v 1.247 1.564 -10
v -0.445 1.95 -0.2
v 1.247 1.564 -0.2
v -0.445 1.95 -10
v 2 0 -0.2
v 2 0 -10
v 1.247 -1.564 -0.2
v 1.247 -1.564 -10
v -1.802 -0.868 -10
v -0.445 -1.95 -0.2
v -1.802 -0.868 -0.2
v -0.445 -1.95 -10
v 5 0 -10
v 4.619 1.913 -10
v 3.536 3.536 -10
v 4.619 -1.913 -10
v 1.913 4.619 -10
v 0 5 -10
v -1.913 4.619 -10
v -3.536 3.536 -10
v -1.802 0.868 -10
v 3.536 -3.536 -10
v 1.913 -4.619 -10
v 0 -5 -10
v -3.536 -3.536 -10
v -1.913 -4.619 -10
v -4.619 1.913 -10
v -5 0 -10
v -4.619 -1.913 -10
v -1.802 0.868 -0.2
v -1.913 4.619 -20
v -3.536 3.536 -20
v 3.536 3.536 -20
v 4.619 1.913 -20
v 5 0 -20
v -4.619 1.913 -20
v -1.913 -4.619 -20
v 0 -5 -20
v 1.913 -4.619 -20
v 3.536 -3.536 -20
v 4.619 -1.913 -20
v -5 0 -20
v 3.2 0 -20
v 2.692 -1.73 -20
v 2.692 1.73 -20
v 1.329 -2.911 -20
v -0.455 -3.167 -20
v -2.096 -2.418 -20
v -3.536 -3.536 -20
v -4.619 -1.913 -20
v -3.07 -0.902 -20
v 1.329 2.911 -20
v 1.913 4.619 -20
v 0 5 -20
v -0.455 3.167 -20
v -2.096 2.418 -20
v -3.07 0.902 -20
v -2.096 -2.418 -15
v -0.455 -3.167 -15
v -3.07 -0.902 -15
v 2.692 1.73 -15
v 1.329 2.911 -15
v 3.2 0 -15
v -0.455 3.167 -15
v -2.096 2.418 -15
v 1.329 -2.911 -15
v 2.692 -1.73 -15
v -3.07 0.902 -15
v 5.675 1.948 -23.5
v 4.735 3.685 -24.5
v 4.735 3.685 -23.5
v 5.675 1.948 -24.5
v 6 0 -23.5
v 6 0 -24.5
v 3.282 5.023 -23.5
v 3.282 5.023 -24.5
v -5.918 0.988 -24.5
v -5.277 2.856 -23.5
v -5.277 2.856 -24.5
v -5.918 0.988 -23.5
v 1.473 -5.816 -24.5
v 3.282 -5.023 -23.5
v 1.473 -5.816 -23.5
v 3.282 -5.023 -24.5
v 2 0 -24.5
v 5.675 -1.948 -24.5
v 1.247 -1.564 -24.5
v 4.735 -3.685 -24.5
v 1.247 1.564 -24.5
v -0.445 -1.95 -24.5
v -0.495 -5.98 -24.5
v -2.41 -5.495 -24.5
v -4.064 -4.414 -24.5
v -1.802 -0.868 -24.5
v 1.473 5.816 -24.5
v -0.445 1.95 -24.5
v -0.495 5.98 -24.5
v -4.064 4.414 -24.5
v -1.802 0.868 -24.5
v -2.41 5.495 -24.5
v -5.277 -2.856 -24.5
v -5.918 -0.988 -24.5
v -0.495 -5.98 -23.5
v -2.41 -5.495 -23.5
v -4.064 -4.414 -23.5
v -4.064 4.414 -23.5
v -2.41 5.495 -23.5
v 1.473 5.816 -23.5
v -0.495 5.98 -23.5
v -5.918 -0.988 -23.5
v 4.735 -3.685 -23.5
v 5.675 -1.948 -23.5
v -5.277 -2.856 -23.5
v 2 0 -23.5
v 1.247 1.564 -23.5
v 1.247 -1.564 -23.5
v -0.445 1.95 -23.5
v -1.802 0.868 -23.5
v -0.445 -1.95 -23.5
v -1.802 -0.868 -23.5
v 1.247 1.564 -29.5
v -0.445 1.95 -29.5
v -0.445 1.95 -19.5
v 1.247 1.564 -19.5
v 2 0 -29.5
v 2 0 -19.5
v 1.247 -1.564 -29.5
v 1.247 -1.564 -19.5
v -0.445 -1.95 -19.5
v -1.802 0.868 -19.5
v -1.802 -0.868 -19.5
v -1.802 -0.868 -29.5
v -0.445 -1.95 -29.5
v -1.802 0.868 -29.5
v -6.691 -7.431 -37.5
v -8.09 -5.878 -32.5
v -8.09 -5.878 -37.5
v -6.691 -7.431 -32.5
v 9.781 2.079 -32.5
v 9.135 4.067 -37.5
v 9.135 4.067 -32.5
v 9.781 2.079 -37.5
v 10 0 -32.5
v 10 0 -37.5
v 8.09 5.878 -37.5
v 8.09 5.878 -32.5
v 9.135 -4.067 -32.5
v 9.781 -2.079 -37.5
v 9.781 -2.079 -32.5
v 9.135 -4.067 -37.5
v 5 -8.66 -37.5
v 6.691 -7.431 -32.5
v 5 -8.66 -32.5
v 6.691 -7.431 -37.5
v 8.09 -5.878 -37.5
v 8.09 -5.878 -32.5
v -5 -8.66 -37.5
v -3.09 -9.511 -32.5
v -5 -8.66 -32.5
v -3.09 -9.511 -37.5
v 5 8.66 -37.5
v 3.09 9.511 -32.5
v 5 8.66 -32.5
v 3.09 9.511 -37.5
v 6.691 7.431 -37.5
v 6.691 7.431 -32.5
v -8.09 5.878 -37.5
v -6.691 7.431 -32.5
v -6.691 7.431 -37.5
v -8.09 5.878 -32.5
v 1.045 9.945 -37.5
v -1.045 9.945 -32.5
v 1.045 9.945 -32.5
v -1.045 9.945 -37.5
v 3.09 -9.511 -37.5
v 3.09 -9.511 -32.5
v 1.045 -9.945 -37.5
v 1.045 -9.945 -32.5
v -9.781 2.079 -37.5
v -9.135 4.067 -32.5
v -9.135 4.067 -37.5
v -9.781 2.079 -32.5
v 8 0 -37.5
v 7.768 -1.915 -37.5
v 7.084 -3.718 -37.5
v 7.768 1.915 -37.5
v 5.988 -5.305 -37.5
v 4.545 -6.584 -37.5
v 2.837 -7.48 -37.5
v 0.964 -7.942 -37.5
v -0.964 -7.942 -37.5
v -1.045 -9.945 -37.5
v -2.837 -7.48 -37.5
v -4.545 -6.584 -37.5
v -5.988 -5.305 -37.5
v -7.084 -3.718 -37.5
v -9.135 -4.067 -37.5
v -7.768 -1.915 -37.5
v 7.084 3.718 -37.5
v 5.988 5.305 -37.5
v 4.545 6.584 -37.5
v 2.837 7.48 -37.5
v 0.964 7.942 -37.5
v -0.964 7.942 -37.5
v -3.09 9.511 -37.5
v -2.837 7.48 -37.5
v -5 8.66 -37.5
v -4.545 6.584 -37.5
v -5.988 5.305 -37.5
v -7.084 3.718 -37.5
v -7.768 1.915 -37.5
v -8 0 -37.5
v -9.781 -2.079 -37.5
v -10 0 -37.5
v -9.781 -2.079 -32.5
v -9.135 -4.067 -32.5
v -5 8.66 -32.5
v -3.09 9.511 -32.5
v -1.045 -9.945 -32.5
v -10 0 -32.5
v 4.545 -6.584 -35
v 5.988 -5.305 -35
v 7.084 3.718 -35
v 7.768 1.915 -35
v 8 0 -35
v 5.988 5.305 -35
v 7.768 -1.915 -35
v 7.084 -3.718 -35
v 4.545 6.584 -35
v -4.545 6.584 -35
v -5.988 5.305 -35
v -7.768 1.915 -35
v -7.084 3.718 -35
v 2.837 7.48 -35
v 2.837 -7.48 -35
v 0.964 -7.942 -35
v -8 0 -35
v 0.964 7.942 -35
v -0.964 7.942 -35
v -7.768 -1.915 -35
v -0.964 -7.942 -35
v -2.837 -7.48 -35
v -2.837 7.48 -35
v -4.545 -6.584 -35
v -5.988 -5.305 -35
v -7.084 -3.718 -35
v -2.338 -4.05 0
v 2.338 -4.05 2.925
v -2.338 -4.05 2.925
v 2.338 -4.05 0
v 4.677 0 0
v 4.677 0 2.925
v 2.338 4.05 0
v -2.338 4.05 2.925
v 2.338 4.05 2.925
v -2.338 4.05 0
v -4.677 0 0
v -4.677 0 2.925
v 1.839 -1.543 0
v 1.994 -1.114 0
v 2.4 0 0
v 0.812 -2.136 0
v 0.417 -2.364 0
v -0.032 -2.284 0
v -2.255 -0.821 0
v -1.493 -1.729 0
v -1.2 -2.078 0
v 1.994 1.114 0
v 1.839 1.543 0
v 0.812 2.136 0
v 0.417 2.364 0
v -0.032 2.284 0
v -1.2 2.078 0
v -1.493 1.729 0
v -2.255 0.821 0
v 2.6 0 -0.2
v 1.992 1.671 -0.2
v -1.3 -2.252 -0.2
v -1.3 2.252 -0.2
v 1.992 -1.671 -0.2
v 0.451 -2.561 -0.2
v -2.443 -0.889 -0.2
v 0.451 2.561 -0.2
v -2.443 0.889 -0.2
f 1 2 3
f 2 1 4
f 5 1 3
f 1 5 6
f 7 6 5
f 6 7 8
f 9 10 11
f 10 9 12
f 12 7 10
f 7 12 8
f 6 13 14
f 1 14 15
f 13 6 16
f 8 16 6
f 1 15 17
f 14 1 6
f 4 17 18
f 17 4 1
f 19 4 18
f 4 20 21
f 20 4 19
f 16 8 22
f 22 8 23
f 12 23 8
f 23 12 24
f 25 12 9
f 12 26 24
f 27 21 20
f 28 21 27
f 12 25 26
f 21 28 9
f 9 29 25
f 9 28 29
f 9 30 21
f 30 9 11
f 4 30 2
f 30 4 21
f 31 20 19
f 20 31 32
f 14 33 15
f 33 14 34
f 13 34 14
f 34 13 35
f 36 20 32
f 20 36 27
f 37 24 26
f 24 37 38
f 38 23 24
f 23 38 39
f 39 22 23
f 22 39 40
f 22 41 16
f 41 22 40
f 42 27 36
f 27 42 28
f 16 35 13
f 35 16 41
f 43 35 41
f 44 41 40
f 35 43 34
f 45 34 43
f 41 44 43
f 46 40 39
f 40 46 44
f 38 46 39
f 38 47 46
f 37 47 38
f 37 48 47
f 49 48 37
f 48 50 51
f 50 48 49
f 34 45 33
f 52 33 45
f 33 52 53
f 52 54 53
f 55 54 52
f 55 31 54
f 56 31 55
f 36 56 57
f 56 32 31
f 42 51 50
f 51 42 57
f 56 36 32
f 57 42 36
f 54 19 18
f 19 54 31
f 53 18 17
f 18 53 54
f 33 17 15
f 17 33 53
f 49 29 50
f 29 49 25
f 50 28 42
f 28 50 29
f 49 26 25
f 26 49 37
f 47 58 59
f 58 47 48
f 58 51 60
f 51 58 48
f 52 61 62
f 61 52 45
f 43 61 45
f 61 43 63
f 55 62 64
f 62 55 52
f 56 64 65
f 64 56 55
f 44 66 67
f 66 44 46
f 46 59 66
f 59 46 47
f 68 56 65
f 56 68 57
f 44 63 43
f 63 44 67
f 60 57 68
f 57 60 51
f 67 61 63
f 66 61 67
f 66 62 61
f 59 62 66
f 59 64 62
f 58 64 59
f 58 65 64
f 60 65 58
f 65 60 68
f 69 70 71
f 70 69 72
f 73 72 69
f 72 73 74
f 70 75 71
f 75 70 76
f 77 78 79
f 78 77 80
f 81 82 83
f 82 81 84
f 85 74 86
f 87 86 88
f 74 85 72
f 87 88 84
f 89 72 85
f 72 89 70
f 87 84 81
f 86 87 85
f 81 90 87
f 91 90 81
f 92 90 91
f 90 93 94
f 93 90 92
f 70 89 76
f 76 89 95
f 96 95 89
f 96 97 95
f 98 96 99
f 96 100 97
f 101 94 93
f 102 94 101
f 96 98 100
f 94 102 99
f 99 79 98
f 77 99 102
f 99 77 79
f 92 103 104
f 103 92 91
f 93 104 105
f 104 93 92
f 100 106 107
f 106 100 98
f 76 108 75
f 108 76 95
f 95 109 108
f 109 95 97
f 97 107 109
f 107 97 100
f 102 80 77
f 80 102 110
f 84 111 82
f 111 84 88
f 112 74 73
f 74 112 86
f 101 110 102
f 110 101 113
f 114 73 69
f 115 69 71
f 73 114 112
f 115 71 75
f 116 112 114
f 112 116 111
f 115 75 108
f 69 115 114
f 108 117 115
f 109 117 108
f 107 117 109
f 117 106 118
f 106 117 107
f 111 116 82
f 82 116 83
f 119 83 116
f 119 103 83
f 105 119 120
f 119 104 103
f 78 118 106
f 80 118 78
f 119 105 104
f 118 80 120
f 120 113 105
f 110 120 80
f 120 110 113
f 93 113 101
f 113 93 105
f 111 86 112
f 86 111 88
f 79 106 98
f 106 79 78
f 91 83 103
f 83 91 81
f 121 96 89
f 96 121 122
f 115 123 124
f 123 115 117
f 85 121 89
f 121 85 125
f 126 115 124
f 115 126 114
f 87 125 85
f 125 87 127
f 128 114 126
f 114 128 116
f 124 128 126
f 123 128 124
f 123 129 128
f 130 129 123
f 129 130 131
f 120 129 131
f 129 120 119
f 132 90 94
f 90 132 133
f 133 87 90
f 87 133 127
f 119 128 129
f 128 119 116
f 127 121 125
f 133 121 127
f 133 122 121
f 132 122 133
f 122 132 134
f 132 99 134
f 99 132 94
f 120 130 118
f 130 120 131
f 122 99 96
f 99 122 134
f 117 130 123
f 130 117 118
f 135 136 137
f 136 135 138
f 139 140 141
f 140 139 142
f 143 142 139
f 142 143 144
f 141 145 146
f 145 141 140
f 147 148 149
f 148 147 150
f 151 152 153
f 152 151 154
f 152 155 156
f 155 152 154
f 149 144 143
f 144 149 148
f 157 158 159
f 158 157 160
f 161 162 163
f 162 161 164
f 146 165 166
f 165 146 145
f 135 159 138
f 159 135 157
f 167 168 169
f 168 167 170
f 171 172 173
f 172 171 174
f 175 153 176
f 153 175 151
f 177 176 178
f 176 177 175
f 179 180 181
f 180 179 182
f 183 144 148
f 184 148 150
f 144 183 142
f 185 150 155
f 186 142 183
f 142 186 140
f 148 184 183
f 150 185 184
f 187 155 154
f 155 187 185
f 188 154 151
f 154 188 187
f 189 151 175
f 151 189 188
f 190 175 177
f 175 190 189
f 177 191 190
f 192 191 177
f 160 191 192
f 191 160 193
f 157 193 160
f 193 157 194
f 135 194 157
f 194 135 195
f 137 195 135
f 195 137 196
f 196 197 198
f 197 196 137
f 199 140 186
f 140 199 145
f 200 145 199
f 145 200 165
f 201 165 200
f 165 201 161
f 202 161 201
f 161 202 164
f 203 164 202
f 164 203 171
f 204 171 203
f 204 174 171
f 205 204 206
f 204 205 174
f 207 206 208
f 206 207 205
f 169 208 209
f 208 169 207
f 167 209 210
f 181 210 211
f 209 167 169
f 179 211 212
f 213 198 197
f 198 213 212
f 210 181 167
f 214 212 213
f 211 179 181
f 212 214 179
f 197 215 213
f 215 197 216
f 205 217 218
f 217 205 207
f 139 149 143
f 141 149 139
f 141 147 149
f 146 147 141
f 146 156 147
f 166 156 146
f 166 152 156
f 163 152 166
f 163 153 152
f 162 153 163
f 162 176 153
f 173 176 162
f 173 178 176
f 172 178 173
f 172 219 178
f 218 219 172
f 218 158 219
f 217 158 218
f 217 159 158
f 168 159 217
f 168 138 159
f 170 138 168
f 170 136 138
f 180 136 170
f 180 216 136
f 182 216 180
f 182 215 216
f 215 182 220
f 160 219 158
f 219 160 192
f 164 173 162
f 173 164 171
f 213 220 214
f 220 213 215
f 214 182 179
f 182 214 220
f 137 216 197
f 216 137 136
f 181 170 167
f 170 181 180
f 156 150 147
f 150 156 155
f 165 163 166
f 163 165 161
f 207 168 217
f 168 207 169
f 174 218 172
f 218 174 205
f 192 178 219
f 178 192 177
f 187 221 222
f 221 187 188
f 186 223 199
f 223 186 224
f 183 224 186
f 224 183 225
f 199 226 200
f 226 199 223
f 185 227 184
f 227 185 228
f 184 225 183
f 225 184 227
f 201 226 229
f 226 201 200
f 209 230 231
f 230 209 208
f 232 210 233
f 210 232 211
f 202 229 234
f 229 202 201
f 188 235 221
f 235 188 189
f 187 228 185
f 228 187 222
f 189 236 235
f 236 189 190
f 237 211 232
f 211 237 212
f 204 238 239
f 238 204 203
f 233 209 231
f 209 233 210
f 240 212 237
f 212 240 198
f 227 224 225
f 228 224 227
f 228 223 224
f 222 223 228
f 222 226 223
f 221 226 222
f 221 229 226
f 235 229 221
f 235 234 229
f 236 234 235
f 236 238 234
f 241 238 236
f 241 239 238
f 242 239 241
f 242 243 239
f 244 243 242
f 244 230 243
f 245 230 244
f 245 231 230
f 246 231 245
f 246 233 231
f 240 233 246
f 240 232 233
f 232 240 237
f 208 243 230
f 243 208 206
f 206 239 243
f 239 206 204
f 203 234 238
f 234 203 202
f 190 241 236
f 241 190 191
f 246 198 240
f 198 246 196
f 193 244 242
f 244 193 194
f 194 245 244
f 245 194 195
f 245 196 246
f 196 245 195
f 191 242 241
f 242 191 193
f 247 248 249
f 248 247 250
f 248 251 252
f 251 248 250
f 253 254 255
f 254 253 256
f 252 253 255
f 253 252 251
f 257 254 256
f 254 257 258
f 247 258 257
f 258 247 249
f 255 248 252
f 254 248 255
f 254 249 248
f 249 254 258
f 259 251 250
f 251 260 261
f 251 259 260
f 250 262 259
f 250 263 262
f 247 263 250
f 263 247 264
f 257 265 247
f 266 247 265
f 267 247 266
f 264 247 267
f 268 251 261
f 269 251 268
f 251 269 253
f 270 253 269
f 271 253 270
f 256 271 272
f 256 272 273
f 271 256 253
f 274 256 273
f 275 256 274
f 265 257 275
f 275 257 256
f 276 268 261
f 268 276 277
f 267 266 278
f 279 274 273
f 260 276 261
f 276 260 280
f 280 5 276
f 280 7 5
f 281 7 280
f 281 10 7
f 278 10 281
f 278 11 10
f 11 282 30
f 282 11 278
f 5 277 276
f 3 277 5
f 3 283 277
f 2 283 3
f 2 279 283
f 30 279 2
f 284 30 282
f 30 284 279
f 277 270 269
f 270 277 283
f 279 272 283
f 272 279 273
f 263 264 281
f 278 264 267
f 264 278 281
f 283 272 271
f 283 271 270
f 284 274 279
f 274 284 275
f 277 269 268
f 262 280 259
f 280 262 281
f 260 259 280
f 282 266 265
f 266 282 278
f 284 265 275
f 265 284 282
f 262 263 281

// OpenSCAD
// Parameters
shank_diameter_mm = 4.0; //[2.0:8.0:0.1]
length_under_head_mm = 10.0; //[5.0:20.0:0.5]
head_across_flats_mm = 8.1; //[4.0:16.2:0.1]
head_height_mm = 2.925; //[1.5:6.0:0.025]
thread_length_mm = 10.0; //[0.0:20.0:0.5]
thread_major_diameter_mm = 4.0; //[2.0:8.0:0.1]
thread_minor_diameter_mm = 3.4; //[1.6:7.0:0.1]
thread_pitch_mm = 0.7; //[0.4:1.5:0.05]
thread_ring_thickness_mm = 0.25; //[0.1:0.6:0.05]
under_head_chamfer_height_mm = 0.6; //[0.2:1.5:0.05]
under_head_chamfer_radial_mm = 0.6; //[0.2:1.5:0.05]
tip_chamfer_height_mm = 0.8; //[0.2:2.0:0.05]
overlap_mm = 0.8; //[0.2:2.0:0.1]
placeholder_size_mm = 0.01; //[0.001:0.1:0.001]

// Hex Head
module hex_head() {
  color("DimGray") {
    translate([0, 0, head_height_mm/2])
      cylinder(h=head_height_mm, r=head_across_flats_mm/(2*cos(30)), center=true, $fn=6);
  }
}

// Shank
module shank() {
  color("Silver") {
    translate([0, 0, -length_under_head_mm/2])
      cylinder(h=length_under_head_mm, r=shank_diameter_mm/2, center=true);
  }
}

// Under Head Fillet or Chamfer
module under_head_fillet_or_chamfer() {
  color("Silver") {
    translate([0, 0, -under_head_chamfer_height_mm/2 + overlap_mm/2])
      cylinder(h=under_head_chamfer_height_mm, r1=shank_diameter_mm/2 + under_head_chamfer_radial_mm, r2=shank_diameter_mm/2, center=true);
  }
}

// Tip Chamfer
module tip_chamfer() {
  color("Silver") {
    translate([0, 0, -length_under_head_mm + tip_chamfer_height_mm/2 - overlap_mm/2])
      cylinder(h=tip_chamfer_height_mm, r1=shank_diameter_mm/2, r2=shank_diameter_mm/2 - tip_chamfer_height_mm/2, center=true);
  }
}

// Threaded Section
module threaded_section() {
  color("Silver") {
    union() {
      translate([0, 0, -length_under_head_mm + thread_length_mm/2])
        cylinder(h=thread_length_mm, r=thread_major_diameter_mm/2, center=true);
      for (i = [0:9]) {
        translate([0, 0, -length_under_head_mm + i*thread_pitch_mm + thread_ring_thickness_mm/2])
          cylinder(h=thread_ring_thickness_mm, r=thread_major_diameter_mm/2, center=true);
      }
    }
  }
}

// PCB Spacer
module pcb_spacer() {
  color([0.85, 0.85, 0.8]) {
    difference() {
      cylinder(h=10, r=5, center=true);
      translate([0, 0, -5])
        cylinder(h=10, r=3.2, center=true);
    }
  }
}

// Screw and Washer
module screw_and_washer() {
  color("Silver") {
    union() {
      translate([0, 0, 1])
        cylinder(h=1, r=6, center=true);
      translate([0, 0, 0.5])
        cylinder(h=10, r=2, center=true);
    }
  }
}

// Buzzer
module buzzer() {
  color([0.1, 0.1, 0.6]) {
    difference() {
      cylinder(h=5, r=10, center=true);
      translate([0, 0, -2.5])
        cylinder(h=5, r=8, center=true);
    }
  }
}

// Assembly
module assembly() {
  union() {
    hex_head();
    shank();
    under_head_fillet_or_chamfer();
    tip_chamfer();
    threaded_section();
    translate([0, 0, -length_under_head_mm - 5]) pcb_spacer();
    translate([0, 0, -length_under_head_mm - 15]) screw_and_washer();
    translate([0, 0, -length_under_head_mm - 25]) buzzer();
  }
}

assembly();
